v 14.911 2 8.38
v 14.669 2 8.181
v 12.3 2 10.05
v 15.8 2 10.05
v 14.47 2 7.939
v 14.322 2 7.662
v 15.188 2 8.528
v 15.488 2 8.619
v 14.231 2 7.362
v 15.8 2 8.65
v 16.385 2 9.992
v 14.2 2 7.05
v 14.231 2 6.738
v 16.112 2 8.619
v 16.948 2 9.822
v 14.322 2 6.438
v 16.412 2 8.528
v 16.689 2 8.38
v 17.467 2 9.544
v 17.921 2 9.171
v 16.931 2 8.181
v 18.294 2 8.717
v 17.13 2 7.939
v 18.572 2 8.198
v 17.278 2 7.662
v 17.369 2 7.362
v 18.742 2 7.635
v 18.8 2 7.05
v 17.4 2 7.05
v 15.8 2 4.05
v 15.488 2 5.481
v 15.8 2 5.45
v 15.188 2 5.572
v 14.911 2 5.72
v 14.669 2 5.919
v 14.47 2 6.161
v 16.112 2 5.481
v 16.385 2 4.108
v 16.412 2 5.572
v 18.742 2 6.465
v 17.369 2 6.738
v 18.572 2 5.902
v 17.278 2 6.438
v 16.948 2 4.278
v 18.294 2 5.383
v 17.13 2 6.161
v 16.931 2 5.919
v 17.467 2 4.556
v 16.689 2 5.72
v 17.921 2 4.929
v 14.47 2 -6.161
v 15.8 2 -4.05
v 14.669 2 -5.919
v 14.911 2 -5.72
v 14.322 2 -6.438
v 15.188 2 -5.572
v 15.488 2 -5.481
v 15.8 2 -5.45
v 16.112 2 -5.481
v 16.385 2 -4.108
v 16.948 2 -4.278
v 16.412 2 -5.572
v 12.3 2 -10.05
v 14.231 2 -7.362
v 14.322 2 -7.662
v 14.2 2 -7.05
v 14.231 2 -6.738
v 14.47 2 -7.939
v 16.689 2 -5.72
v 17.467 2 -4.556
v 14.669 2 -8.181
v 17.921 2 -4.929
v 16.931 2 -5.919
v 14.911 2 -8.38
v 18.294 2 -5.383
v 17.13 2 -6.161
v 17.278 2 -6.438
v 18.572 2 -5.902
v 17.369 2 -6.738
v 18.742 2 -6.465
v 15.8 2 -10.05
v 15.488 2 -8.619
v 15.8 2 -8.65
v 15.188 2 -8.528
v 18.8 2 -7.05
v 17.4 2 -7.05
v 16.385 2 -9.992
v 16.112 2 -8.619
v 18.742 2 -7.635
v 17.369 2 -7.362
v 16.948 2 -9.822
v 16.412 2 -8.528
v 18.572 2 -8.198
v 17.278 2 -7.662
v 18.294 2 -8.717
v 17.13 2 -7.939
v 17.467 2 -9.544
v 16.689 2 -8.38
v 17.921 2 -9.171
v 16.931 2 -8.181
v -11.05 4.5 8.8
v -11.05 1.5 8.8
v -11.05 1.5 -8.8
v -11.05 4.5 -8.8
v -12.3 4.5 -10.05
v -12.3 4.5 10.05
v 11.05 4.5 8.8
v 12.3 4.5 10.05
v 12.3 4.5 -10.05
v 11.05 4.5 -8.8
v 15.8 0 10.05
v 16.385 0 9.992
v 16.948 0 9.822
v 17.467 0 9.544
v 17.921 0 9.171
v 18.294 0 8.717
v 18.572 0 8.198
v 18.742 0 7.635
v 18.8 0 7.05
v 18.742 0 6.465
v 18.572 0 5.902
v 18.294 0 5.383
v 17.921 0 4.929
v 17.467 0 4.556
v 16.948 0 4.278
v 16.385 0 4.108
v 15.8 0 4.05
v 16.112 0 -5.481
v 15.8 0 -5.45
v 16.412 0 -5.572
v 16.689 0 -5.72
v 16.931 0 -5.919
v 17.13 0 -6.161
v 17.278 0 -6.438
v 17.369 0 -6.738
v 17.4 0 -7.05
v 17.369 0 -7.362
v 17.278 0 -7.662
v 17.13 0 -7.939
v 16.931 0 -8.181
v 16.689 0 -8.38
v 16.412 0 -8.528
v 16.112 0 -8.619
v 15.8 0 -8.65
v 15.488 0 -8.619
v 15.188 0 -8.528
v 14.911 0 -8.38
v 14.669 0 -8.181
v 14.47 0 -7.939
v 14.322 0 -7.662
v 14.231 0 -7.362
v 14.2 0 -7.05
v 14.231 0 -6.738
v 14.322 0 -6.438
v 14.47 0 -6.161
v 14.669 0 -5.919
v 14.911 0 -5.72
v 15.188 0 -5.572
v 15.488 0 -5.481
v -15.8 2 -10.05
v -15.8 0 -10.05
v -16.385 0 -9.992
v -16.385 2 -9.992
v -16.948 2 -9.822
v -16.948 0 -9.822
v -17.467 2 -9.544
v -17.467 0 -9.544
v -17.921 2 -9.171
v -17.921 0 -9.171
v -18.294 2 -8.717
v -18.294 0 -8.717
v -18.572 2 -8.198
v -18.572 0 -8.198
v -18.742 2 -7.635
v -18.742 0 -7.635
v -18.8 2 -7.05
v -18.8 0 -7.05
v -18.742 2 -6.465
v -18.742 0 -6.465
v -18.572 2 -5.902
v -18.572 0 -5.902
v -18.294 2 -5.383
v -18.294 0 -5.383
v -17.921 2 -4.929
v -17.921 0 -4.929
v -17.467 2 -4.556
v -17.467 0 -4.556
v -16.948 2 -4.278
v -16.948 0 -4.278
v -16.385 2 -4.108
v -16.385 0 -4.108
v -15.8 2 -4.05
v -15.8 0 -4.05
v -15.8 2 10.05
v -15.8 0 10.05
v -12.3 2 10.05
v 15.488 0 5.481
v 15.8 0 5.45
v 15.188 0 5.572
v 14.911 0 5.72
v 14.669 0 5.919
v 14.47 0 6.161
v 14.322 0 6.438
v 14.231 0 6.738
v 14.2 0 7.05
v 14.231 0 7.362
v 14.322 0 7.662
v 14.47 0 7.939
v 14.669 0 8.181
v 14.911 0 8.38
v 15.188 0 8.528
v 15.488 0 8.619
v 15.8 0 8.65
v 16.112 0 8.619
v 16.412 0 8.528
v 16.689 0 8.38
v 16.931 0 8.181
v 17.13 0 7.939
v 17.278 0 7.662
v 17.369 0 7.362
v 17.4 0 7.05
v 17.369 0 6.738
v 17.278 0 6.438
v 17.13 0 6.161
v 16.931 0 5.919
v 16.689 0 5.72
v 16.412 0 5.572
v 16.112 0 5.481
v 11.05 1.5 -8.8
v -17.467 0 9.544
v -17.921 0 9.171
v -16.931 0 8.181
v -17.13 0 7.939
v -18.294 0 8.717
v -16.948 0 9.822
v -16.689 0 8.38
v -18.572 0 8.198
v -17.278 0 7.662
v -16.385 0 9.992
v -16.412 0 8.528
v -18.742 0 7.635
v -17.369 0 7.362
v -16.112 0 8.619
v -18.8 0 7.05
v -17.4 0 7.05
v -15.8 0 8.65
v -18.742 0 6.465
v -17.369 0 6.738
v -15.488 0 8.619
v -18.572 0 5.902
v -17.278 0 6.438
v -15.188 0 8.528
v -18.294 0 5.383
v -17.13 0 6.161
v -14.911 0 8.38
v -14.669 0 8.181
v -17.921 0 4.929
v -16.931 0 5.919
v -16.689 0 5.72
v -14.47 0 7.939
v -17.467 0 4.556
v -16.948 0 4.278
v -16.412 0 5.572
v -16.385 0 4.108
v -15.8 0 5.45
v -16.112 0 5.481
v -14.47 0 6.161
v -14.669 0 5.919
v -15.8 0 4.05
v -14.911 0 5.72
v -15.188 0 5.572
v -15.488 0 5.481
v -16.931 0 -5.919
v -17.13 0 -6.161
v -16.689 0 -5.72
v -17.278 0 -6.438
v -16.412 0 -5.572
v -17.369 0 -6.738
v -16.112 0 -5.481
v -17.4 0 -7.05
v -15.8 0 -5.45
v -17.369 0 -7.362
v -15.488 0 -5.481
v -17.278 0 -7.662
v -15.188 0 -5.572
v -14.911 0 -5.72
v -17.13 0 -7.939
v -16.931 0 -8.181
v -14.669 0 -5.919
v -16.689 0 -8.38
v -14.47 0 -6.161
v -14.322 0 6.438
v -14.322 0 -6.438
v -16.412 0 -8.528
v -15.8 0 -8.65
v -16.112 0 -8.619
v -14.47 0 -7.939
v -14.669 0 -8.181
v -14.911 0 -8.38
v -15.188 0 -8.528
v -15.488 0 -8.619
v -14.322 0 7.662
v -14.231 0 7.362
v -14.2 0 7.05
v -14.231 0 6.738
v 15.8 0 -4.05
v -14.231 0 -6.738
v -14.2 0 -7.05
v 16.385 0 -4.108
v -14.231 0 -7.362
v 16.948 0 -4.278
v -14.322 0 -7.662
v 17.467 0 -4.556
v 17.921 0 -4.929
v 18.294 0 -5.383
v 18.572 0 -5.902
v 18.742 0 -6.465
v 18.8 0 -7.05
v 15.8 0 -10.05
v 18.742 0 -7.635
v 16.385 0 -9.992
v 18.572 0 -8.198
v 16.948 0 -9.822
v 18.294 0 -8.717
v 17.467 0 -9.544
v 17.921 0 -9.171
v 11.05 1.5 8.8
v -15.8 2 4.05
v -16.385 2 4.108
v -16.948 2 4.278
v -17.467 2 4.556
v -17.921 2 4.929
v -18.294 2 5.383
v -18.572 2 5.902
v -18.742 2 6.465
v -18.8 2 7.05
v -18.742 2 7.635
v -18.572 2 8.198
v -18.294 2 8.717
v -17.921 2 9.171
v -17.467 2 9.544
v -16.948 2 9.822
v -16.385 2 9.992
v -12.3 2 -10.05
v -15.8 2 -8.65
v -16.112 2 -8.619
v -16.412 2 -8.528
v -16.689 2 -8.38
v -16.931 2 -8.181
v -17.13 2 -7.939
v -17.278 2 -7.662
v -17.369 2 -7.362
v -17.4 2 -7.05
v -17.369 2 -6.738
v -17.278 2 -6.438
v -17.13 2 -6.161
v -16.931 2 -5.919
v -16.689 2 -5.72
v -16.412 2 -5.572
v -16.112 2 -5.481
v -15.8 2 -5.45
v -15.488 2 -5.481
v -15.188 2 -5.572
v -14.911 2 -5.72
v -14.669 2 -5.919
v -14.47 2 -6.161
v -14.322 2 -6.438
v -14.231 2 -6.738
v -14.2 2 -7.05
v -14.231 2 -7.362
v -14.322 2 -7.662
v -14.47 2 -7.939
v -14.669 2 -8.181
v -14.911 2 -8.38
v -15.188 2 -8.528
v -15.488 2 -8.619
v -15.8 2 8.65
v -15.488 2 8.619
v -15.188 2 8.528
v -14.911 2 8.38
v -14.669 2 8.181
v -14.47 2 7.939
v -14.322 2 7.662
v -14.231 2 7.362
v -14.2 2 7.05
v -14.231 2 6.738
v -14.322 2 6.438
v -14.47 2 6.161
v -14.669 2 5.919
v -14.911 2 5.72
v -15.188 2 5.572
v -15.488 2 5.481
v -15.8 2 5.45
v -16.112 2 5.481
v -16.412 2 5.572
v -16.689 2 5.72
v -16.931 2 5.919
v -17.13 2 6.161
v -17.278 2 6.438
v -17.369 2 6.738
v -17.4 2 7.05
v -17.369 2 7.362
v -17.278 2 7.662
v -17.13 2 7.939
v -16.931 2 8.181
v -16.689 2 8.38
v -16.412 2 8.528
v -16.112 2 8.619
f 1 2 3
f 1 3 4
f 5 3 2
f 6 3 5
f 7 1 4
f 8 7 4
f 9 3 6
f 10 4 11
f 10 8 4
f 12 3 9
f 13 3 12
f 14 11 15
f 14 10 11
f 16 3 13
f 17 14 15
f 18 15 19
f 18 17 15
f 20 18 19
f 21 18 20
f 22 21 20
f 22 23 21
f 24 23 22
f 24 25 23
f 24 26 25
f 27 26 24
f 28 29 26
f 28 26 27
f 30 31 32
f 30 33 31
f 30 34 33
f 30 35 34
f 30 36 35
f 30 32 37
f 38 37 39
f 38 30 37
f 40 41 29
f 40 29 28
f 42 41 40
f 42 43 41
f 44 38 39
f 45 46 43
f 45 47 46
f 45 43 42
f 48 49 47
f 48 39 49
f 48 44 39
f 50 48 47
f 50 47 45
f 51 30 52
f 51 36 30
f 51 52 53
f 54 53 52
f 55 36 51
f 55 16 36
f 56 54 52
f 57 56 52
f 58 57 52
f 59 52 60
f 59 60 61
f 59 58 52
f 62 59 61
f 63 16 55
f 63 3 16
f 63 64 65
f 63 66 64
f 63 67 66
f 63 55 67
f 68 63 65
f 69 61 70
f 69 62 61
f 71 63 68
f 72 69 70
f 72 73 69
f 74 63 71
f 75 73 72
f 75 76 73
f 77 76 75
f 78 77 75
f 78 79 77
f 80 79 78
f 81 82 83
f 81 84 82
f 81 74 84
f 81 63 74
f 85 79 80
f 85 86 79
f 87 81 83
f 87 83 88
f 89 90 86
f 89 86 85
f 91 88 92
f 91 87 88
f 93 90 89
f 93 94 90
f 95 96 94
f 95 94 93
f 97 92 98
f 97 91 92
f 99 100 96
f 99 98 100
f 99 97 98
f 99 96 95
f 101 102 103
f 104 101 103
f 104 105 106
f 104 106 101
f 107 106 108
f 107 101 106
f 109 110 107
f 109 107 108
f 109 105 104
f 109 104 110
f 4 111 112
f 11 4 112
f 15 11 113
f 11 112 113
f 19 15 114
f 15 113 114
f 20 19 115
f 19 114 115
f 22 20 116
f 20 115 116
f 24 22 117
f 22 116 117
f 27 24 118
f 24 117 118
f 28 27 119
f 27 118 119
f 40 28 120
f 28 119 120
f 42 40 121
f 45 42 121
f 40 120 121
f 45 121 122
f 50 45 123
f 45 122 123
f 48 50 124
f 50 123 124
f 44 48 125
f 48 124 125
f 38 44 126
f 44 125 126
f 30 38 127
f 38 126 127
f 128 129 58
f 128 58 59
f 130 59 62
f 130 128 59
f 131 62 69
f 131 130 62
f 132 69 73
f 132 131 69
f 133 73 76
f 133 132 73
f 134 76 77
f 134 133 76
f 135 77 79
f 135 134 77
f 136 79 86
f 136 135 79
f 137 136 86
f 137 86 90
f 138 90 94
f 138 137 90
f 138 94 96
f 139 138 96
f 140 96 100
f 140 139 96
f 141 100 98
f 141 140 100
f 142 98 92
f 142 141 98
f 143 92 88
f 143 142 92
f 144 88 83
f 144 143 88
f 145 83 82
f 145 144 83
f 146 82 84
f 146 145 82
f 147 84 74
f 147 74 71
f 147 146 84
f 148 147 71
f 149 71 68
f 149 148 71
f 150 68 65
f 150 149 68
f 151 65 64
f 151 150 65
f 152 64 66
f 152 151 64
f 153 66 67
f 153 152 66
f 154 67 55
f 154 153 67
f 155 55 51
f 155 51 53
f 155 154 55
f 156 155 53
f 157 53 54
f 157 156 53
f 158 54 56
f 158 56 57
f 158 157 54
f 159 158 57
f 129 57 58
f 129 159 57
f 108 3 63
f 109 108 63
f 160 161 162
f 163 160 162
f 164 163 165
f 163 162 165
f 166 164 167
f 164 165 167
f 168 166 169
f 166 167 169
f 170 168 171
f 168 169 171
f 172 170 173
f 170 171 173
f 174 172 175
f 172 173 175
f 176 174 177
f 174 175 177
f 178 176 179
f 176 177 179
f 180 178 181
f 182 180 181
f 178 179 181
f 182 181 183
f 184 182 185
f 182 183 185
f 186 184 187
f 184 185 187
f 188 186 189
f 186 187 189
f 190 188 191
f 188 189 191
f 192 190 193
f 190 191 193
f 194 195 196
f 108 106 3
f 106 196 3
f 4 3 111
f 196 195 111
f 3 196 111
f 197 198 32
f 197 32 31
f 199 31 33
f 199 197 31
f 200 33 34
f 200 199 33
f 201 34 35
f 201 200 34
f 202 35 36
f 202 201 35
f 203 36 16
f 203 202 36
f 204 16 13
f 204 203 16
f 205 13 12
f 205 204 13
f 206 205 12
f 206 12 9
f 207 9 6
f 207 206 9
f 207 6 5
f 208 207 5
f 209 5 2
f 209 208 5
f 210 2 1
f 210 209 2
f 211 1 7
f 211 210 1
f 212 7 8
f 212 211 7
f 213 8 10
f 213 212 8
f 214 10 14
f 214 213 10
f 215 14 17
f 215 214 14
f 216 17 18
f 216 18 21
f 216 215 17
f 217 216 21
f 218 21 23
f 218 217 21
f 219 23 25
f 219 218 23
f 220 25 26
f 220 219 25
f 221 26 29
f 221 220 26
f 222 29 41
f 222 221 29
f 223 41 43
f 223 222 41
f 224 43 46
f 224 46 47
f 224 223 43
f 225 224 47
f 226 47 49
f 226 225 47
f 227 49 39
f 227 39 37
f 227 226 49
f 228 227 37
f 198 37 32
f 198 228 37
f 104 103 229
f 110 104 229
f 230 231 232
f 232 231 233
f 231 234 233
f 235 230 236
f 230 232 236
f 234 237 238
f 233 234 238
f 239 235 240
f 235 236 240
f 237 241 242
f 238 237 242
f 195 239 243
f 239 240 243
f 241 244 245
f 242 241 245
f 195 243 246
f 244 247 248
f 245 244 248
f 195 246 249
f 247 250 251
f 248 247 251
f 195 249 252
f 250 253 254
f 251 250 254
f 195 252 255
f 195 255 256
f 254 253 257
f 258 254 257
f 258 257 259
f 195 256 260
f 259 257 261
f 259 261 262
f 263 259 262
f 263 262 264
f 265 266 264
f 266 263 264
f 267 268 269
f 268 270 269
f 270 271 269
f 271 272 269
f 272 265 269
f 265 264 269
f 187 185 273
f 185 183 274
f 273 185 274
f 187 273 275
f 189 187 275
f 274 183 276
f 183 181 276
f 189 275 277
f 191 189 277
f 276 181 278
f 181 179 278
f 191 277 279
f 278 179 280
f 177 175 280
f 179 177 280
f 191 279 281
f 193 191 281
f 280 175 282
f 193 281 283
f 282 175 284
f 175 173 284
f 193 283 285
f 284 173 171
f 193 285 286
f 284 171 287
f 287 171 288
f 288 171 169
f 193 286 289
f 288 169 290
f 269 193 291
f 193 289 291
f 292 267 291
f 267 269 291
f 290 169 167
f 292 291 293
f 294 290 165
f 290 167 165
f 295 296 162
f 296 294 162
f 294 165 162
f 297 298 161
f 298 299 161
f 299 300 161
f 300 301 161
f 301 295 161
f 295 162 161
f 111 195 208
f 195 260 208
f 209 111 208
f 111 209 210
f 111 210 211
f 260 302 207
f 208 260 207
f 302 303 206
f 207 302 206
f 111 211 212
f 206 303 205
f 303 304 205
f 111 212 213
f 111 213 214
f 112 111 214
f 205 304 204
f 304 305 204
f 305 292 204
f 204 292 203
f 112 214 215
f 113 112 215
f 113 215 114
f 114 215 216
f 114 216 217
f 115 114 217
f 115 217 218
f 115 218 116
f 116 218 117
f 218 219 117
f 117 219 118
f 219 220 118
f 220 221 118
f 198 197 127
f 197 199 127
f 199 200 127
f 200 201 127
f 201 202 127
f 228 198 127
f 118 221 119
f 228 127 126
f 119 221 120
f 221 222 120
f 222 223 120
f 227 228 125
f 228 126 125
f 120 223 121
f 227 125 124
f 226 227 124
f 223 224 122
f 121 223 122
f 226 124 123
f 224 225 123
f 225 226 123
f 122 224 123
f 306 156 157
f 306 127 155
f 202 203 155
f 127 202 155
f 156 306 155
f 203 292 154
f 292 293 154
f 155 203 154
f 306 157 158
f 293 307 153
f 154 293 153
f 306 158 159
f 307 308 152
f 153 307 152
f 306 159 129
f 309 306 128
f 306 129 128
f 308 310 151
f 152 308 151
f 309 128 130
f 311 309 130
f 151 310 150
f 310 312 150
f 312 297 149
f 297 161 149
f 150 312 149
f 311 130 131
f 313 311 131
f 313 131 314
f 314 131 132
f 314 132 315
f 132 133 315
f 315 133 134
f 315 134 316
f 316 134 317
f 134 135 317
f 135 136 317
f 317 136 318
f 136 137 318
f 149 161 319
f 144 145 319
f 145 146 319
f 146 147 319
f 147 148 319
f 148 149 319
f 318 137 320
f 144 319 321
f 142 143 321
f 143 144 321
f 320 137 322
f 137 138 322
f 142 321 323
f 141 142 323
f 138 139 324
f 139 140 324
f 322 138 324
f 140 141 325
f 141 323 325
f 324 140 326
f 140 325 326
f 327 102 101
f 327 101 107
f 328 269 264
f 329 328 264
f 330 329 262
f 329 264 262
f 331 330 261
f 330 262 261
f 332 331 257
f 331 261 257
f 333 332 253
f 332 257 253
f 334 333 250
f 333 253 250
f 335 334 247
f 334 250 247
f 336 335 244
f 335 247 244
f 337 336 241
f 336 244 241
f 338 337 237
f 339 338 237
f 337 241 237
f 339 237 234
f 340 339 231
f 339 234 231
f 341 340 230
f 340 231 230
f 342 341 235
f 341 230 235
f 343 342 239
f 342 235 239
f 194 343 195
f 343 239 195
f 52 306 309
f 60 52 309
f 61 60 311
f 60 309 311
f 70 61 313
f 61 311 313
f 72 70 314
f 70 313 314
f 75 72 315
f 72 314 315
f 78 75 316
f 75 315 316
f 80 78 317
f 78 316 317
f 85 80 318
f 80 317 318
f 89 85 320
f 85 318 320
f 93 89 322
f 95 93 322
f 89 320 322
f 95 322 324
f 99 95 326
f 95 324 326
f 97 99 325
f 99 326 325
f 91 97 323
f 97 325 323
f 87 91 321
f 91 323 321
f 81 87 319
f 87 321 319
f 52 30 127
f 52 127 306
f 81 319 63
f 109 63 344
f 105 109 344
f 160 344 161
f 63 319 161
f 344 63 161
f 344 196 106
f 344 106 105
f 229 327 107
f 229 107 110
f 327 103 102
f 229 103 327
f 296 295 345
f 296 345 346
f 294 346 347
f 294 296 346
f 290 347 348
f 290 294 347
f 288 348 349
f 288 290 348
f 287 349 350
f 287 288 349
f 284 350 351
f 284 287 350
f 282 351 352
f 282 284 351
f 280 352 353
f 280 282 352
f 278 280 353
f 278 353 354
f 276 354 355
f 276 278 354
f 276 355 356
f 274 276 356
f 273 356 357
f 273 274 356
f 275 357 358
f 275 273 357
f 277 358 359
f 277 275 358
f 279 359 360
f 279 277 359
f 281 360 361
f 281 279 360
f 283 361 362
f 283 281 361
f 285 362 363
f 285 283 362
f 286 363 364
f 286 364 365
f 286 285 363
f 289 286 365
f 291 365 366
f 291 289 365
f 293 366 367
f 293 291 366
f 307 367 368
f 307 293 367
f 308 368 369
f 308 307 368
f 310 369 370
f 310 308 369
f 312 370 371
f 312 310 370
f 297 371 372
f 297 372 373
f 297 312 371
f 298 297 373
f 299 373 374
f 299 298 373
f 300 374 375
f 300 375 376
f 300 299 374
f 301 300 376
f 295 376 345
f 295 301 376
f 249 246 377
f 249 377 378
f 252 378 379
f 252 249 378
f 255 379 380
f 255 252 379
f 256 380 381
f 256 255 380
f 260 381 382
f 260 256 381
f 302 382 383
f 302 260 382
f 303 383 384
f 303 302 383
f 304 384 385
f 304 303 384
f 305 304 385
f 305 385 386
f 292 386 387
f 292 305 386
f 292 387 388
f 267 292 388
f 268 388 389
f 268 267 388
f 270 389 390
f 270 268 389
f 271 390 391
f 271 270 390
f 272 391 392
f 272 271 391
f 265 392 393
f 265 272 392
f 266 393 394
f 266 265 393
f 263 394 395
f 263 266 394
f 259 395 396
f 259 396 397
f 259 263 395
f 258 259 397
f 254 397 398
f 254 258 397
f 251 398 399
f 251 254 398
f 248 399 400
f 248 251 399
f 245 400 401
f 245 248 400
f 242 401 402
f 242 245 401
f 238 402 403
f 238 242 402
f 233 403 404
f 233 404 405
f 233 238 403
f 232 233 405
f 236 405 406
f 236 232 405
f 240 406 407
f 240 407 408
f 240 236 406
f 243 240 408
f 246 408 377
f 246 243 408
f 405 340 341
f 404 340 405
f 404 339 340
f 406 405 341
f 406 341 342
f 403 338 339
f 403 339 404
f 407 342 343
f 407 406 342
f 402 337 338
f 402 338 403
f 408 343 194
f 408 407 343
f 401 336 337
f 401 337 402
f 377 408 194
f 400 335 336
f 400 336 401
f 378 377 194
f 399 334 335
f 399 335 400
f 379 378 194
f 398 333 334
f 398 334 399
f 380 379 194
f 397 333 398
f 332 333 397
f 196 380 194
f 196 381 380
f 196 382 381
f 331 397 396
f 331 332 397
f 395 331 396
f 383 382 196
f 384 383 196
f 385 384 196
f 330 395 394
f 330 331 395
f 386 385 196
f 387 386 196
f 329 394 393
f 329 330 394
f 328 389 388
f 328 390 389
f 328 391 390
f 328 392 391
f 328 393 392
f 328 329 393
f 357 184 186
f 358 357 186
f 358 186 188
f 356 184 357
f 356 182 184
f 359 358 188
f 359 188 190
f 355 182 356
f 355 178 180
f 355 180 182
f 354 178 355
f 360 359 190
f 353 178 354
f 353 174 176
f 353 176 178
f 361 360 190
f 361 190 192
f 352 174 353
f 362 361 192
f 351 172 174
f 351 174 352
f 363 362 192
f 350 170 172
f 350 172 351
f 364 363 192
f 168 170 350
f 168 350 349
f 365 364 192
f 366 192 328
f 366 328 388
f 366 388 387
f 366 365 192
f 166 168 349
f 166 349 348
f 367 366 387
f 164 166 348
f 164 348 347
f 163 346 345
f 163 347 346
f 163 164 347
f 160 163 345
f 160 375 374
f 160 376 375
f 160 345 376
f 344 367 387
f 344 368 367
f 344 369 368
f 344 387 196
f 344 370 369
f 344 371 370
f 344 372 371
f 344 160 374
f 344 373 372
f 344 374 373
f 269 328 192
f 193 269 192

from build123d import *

# Parameters (mm, degrees)
SKETCH1_W           = 24.6
SKETCH1_H           = 20.1
BOSS_EXTRUDE1_DEPTH = 1.5
SKETCH2_W           = 24.6
SKETCH2_H           = 20.1
SKETCH2_W_2         = 22.1
SKETCH2_H_2         = 17.6
BOSS_EXTRUDE2_DEPTH = 3
SKETCH4_R           = 1.6
BOSS_EXTRUDE4_DEPTH = 2
SKETCH8_W           = 3.5
SKETCH8_H           = 8.1
BOSS_EXTRUDE5_DEPTH = 2


with BuildPart() as part:
    # Sketch1 → Boss-Extrude1 (new body)
    with BuildSketch(Plane(origin=(0, 0, 0), x_dir=(1, 0, 0), z_dir=(0, 1, 0))):
        Rectangle(SKETCH1_W, SKETCH1_H)
    extrude(amount=BOSS_EXTRUDE1_DEPTH)

    # Sketch2 → Boss-Extrude2 (add)
    with BuildSketch(Plane(origin=(0, 1.5, 0), x_dir=(1, 0, 0), z_dir=(0, 1, 0))):
        Rectangle(SKETCH2_W, SKETCH2_H)
        Rectangle(SKETCH2_W_2, SKETCH2_H_2, mode=Mode.SUBTRACT)
    extrude(amount=BOSS_EXTRUDE2_DEPTH)

    # Sketch4 → Boss-Extrude4 (add)
    # profile 1 of 4: a face of its own
    with BuildSketch(Plane(origin=(0, 0, 0), x_dir=(1, 0, 0), z_dir=(0, 1, 0))):
        with BuildLine():
            Line((15.8, 10.05), (12.3, 10.05))
            Line((12.3, 10.05), (12.3, 4.05))
            Line((12.3, 4.05), (15.8, 4.05))
            ThreePointArc((15.8, 4.05), (18.8, 7.05), (15.8, 10.05))
        make_face()
        with Locations(Location((15.8, 7.05, 0), (0, 0, 270))):
            Circle(SKETCH4_R, mode=Mode.SUBTRACT)
    # profile 2 of 4: a face of its own
    with BuildSketch(Plane(origin=(0, 0, 0), x_dir=(1, 0, 0), z_dir=(0, 1, 0))):
        with BuildLine():
            Line((-15.8, 4.05), (-12.3, 4.05))
            Line((-12.3, 4.05), (-12.3, 10.05))
            Line((-12.3, 10.05), (-15.8, 10.05))
            ThreePointArc((-15.8, 10.05), (-18.8, 7.05), (-15.8, 4.05))
        make_face()
        with Locations(Location((-15.8, 7.05, 0), (0, 0, 90))):
            Circle(SKETCH4_R, mode=Mode.SUBTRACT)
    # profile 3 of 4: a face of its own
    with BuildSketch(Plane(origin=(0, 0, 0), x_dir=(1, 0, 0), z_dir=(0, 1, 0))):
        with BuildLine():
            Line((15.8, -4.05), (12.3, -4.05))
            Line((12.3, -4.05), (12.3, -10.05))
            Line((12.3, -10.05), (15.8, -10.05))
            ThreePointArc((15.8, -10.05), (18.8, -7.05), (15.8, -4.05))
        make_face()
        with Locations(Location((15.8, -7.05, 0), (0, 0, 90))):
            Circle(SKETCH4_R, mode=Mode.SUBTRACT)
    # profile 4 of 4: a face of its own
    with BuildSketch(Plane(origin=(0, 0, 0), x_dir=(1, 0, 0), z_dir=(0, 1, 0))):
        with BuildLine():
            Line((-15.8, -10.05), (-12.3, -10.05))
            Line((-12.3, -10.05), (-12.3, -4.05))
            Line((-12.3, -4.05), (-15.8, -4.05))
            ThreePointArc((-15.8, -4.05), (-18.8, -7.05), (-15.8, -10.05))
        make_face()
        with Locations(Location((-15.8, -7.05, 0), (0, 0, 270))):
            Circle(SKETCH4_R, mode=Mode.SUBTRACT)
    extrude(amount=BOSS_EXTRUDE4_DEPTH)

    # Sketch8 → Boss-Extrude5 (add, through all)
    with BuildSketch(Plane(origin=(0, 2, 0), x_dir=(1, 0, 0), z_dir=(0, 1, 0))):
        with Locations((-14.05, 0)):
            Rectangle(SKETCH8_W, SKETCH8_H)
        with Locations((14.05, 0)):
            Rectangle(SKETCH8_W, SKETCH8_H)
    extrude(amount=-BOSS_EXTRUDE5_DEPTH)


solid = part.part
